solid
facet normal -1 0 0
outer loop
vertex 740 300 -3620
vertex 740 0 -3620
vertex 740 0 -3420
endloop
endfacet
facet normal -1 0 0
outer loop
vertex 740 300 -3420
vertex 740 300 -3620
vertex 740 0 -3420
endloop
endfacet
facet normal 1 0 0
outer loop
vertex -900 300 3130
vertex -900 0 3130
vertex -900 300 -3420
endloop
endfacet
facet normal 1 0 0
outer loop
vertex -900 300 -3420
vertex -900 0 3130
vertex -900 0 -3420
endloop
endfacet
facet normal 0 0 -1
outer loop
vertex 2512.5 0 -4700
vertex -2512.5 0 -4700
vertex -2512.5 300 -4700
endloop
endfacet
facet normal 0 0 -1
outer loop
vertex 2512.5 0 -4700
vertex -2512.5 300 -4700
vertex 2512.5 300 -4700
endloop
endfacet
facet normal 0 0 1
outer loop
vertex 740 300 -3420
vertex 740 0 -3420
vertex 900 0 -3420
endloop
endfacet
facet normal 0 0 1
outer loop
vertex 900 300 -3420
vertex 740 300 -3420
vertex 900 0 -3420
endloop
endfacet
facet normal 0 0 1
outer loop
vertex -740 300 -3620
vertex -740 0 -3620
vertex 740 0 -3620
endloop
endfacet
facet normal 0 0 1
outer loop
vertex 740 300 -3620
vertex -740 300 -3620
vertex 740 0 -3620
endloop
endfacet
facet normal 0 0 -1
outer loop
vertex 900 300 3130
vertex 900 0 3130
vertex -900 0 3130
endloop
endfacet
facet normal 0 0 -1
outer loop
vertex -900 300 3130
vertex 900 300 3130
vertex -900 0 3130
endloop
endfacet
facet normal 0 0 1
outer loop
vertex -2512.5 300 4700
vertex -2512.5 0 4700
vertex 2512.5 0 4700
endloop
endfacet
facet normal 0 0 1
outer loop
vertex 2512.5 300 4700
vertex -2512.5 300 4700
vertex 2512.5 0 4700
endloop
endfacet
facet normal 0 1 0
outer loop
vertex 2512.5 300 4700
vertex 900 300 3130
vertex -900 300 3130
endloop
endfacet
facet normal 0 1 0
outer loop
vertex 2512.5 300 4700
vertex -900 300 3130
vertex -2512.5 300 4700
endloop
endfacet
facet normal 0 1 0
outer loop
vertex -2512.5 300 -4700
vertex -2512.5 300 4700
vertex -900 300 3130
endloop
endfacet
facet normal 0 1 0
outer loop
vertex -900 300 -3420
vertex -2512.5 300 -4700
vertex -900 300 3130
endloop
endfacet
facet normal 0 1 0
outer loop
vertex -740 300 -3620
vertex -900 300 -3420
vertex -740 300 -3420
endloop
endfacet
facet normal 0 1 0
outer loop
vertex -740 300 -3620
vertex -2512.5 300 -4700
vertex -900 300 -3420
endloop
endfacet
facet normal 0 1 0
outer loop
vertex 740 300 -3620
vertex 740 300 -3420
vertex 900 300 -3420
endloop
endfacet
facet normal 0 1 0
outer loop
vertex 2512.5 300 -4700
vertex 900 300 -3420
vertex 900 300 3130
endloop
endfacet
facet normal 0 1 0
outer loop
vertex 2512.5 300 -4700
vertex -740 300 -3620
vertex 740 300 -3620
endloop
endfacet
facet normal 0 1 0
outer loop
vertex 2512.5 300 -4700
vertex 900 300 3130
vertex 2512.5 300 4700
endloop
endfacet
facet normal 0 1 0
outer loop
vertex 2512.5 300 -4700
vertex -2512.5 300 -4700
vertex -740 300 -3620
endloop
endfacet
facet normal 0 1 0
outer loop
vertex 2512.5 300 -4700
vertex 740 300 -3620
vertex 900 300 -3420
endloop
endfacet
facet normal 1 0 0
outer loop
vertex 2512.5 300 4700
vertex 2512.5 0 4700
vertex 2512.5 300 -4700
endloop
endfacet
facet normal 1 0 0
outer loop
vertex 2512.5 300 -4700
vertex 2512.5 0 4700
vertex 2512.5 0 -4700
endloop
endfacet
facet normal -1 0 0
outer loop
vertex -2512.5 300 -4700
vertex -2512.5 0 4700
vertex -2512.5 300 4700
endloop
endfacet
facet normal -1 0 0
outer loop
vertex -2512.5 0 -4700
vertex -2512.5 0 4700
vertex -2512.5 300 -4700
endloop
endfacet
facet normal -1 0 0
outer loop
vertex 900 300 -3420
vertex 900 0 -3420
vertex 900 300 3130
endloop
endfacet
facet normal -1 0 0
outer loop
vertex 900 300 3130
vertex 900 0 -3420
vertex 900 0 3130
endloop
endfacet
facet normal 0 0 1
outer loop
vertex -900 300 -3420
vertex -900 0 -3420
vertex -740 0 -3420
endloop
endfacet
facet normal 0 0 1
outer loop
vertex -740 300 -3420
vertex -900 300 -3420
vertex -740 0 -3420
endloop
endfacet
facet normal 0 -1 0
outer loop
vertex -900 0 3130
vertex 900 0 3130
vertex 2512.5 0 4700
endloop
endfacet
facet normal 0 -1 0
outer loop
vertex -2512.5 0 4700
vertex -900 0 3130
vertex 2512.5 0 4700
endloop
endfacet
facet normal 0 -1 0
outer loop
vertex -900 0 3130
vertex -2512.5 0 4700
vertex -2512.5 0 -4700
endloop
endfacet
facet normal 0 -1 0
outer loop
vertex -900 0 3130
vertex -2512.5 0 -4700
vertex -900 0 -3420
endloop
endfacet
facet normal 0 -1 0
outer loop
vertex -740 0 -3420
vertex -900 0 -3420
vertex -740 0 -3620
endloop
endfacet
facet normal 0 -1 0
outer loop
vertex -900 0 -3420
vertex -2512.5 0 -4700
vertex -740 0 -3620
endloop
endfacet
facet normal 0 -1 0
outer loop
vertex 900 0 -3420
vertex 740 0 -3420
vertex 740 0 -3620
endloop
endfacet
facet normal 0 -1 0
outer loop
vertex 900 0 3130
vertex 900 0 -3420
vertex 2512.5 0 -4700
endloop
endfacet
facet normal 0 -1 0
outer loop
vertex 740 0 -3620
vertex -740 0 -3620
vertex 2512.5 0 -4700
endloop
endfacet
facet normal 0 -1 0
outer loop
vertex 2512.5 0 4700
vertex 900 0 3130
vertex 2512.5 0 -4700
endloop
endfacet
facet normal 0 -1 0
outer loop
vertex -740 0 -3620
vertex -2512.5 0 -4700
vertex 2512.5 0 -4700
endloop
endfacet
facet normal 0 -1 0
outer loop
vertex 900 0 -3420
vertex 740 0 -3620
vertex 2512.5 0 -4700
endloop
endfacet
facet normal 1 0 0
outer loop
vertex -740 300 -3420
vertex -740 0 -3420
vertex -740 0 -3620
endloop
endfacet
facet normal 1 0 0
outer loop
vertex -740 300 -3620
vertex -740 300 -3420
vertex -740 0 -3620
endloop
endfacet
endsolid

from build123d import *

# Parameters (mm, degrees)
SKETCH_1_W      = 5025
SKETCH_1_H      = 9400
EXTRUDE_1_DEPTH = 300


with BuildPart() as part:
    # Эскиз1 → Бобышка-Вытянуть1 (new body)
    with BuildSketch(Plane(origin=(0, 0, 0), x_dir=(1, 0, 0), z_dir=(0, 1, 0))):
        Rectangle(SKETCH_1_W, SKETCH_1_H)
        Polygon((900, -3130), (-900, -3130), (-900, 3420), (-740, 3420), (-740, 3620), (740, 3620), (740, 3420), (900, 3420), align=None, mode=Mode.SUBTRACT)
    extrude(amount=EXTRUDE_1_DEPTH)


solid = part.part
